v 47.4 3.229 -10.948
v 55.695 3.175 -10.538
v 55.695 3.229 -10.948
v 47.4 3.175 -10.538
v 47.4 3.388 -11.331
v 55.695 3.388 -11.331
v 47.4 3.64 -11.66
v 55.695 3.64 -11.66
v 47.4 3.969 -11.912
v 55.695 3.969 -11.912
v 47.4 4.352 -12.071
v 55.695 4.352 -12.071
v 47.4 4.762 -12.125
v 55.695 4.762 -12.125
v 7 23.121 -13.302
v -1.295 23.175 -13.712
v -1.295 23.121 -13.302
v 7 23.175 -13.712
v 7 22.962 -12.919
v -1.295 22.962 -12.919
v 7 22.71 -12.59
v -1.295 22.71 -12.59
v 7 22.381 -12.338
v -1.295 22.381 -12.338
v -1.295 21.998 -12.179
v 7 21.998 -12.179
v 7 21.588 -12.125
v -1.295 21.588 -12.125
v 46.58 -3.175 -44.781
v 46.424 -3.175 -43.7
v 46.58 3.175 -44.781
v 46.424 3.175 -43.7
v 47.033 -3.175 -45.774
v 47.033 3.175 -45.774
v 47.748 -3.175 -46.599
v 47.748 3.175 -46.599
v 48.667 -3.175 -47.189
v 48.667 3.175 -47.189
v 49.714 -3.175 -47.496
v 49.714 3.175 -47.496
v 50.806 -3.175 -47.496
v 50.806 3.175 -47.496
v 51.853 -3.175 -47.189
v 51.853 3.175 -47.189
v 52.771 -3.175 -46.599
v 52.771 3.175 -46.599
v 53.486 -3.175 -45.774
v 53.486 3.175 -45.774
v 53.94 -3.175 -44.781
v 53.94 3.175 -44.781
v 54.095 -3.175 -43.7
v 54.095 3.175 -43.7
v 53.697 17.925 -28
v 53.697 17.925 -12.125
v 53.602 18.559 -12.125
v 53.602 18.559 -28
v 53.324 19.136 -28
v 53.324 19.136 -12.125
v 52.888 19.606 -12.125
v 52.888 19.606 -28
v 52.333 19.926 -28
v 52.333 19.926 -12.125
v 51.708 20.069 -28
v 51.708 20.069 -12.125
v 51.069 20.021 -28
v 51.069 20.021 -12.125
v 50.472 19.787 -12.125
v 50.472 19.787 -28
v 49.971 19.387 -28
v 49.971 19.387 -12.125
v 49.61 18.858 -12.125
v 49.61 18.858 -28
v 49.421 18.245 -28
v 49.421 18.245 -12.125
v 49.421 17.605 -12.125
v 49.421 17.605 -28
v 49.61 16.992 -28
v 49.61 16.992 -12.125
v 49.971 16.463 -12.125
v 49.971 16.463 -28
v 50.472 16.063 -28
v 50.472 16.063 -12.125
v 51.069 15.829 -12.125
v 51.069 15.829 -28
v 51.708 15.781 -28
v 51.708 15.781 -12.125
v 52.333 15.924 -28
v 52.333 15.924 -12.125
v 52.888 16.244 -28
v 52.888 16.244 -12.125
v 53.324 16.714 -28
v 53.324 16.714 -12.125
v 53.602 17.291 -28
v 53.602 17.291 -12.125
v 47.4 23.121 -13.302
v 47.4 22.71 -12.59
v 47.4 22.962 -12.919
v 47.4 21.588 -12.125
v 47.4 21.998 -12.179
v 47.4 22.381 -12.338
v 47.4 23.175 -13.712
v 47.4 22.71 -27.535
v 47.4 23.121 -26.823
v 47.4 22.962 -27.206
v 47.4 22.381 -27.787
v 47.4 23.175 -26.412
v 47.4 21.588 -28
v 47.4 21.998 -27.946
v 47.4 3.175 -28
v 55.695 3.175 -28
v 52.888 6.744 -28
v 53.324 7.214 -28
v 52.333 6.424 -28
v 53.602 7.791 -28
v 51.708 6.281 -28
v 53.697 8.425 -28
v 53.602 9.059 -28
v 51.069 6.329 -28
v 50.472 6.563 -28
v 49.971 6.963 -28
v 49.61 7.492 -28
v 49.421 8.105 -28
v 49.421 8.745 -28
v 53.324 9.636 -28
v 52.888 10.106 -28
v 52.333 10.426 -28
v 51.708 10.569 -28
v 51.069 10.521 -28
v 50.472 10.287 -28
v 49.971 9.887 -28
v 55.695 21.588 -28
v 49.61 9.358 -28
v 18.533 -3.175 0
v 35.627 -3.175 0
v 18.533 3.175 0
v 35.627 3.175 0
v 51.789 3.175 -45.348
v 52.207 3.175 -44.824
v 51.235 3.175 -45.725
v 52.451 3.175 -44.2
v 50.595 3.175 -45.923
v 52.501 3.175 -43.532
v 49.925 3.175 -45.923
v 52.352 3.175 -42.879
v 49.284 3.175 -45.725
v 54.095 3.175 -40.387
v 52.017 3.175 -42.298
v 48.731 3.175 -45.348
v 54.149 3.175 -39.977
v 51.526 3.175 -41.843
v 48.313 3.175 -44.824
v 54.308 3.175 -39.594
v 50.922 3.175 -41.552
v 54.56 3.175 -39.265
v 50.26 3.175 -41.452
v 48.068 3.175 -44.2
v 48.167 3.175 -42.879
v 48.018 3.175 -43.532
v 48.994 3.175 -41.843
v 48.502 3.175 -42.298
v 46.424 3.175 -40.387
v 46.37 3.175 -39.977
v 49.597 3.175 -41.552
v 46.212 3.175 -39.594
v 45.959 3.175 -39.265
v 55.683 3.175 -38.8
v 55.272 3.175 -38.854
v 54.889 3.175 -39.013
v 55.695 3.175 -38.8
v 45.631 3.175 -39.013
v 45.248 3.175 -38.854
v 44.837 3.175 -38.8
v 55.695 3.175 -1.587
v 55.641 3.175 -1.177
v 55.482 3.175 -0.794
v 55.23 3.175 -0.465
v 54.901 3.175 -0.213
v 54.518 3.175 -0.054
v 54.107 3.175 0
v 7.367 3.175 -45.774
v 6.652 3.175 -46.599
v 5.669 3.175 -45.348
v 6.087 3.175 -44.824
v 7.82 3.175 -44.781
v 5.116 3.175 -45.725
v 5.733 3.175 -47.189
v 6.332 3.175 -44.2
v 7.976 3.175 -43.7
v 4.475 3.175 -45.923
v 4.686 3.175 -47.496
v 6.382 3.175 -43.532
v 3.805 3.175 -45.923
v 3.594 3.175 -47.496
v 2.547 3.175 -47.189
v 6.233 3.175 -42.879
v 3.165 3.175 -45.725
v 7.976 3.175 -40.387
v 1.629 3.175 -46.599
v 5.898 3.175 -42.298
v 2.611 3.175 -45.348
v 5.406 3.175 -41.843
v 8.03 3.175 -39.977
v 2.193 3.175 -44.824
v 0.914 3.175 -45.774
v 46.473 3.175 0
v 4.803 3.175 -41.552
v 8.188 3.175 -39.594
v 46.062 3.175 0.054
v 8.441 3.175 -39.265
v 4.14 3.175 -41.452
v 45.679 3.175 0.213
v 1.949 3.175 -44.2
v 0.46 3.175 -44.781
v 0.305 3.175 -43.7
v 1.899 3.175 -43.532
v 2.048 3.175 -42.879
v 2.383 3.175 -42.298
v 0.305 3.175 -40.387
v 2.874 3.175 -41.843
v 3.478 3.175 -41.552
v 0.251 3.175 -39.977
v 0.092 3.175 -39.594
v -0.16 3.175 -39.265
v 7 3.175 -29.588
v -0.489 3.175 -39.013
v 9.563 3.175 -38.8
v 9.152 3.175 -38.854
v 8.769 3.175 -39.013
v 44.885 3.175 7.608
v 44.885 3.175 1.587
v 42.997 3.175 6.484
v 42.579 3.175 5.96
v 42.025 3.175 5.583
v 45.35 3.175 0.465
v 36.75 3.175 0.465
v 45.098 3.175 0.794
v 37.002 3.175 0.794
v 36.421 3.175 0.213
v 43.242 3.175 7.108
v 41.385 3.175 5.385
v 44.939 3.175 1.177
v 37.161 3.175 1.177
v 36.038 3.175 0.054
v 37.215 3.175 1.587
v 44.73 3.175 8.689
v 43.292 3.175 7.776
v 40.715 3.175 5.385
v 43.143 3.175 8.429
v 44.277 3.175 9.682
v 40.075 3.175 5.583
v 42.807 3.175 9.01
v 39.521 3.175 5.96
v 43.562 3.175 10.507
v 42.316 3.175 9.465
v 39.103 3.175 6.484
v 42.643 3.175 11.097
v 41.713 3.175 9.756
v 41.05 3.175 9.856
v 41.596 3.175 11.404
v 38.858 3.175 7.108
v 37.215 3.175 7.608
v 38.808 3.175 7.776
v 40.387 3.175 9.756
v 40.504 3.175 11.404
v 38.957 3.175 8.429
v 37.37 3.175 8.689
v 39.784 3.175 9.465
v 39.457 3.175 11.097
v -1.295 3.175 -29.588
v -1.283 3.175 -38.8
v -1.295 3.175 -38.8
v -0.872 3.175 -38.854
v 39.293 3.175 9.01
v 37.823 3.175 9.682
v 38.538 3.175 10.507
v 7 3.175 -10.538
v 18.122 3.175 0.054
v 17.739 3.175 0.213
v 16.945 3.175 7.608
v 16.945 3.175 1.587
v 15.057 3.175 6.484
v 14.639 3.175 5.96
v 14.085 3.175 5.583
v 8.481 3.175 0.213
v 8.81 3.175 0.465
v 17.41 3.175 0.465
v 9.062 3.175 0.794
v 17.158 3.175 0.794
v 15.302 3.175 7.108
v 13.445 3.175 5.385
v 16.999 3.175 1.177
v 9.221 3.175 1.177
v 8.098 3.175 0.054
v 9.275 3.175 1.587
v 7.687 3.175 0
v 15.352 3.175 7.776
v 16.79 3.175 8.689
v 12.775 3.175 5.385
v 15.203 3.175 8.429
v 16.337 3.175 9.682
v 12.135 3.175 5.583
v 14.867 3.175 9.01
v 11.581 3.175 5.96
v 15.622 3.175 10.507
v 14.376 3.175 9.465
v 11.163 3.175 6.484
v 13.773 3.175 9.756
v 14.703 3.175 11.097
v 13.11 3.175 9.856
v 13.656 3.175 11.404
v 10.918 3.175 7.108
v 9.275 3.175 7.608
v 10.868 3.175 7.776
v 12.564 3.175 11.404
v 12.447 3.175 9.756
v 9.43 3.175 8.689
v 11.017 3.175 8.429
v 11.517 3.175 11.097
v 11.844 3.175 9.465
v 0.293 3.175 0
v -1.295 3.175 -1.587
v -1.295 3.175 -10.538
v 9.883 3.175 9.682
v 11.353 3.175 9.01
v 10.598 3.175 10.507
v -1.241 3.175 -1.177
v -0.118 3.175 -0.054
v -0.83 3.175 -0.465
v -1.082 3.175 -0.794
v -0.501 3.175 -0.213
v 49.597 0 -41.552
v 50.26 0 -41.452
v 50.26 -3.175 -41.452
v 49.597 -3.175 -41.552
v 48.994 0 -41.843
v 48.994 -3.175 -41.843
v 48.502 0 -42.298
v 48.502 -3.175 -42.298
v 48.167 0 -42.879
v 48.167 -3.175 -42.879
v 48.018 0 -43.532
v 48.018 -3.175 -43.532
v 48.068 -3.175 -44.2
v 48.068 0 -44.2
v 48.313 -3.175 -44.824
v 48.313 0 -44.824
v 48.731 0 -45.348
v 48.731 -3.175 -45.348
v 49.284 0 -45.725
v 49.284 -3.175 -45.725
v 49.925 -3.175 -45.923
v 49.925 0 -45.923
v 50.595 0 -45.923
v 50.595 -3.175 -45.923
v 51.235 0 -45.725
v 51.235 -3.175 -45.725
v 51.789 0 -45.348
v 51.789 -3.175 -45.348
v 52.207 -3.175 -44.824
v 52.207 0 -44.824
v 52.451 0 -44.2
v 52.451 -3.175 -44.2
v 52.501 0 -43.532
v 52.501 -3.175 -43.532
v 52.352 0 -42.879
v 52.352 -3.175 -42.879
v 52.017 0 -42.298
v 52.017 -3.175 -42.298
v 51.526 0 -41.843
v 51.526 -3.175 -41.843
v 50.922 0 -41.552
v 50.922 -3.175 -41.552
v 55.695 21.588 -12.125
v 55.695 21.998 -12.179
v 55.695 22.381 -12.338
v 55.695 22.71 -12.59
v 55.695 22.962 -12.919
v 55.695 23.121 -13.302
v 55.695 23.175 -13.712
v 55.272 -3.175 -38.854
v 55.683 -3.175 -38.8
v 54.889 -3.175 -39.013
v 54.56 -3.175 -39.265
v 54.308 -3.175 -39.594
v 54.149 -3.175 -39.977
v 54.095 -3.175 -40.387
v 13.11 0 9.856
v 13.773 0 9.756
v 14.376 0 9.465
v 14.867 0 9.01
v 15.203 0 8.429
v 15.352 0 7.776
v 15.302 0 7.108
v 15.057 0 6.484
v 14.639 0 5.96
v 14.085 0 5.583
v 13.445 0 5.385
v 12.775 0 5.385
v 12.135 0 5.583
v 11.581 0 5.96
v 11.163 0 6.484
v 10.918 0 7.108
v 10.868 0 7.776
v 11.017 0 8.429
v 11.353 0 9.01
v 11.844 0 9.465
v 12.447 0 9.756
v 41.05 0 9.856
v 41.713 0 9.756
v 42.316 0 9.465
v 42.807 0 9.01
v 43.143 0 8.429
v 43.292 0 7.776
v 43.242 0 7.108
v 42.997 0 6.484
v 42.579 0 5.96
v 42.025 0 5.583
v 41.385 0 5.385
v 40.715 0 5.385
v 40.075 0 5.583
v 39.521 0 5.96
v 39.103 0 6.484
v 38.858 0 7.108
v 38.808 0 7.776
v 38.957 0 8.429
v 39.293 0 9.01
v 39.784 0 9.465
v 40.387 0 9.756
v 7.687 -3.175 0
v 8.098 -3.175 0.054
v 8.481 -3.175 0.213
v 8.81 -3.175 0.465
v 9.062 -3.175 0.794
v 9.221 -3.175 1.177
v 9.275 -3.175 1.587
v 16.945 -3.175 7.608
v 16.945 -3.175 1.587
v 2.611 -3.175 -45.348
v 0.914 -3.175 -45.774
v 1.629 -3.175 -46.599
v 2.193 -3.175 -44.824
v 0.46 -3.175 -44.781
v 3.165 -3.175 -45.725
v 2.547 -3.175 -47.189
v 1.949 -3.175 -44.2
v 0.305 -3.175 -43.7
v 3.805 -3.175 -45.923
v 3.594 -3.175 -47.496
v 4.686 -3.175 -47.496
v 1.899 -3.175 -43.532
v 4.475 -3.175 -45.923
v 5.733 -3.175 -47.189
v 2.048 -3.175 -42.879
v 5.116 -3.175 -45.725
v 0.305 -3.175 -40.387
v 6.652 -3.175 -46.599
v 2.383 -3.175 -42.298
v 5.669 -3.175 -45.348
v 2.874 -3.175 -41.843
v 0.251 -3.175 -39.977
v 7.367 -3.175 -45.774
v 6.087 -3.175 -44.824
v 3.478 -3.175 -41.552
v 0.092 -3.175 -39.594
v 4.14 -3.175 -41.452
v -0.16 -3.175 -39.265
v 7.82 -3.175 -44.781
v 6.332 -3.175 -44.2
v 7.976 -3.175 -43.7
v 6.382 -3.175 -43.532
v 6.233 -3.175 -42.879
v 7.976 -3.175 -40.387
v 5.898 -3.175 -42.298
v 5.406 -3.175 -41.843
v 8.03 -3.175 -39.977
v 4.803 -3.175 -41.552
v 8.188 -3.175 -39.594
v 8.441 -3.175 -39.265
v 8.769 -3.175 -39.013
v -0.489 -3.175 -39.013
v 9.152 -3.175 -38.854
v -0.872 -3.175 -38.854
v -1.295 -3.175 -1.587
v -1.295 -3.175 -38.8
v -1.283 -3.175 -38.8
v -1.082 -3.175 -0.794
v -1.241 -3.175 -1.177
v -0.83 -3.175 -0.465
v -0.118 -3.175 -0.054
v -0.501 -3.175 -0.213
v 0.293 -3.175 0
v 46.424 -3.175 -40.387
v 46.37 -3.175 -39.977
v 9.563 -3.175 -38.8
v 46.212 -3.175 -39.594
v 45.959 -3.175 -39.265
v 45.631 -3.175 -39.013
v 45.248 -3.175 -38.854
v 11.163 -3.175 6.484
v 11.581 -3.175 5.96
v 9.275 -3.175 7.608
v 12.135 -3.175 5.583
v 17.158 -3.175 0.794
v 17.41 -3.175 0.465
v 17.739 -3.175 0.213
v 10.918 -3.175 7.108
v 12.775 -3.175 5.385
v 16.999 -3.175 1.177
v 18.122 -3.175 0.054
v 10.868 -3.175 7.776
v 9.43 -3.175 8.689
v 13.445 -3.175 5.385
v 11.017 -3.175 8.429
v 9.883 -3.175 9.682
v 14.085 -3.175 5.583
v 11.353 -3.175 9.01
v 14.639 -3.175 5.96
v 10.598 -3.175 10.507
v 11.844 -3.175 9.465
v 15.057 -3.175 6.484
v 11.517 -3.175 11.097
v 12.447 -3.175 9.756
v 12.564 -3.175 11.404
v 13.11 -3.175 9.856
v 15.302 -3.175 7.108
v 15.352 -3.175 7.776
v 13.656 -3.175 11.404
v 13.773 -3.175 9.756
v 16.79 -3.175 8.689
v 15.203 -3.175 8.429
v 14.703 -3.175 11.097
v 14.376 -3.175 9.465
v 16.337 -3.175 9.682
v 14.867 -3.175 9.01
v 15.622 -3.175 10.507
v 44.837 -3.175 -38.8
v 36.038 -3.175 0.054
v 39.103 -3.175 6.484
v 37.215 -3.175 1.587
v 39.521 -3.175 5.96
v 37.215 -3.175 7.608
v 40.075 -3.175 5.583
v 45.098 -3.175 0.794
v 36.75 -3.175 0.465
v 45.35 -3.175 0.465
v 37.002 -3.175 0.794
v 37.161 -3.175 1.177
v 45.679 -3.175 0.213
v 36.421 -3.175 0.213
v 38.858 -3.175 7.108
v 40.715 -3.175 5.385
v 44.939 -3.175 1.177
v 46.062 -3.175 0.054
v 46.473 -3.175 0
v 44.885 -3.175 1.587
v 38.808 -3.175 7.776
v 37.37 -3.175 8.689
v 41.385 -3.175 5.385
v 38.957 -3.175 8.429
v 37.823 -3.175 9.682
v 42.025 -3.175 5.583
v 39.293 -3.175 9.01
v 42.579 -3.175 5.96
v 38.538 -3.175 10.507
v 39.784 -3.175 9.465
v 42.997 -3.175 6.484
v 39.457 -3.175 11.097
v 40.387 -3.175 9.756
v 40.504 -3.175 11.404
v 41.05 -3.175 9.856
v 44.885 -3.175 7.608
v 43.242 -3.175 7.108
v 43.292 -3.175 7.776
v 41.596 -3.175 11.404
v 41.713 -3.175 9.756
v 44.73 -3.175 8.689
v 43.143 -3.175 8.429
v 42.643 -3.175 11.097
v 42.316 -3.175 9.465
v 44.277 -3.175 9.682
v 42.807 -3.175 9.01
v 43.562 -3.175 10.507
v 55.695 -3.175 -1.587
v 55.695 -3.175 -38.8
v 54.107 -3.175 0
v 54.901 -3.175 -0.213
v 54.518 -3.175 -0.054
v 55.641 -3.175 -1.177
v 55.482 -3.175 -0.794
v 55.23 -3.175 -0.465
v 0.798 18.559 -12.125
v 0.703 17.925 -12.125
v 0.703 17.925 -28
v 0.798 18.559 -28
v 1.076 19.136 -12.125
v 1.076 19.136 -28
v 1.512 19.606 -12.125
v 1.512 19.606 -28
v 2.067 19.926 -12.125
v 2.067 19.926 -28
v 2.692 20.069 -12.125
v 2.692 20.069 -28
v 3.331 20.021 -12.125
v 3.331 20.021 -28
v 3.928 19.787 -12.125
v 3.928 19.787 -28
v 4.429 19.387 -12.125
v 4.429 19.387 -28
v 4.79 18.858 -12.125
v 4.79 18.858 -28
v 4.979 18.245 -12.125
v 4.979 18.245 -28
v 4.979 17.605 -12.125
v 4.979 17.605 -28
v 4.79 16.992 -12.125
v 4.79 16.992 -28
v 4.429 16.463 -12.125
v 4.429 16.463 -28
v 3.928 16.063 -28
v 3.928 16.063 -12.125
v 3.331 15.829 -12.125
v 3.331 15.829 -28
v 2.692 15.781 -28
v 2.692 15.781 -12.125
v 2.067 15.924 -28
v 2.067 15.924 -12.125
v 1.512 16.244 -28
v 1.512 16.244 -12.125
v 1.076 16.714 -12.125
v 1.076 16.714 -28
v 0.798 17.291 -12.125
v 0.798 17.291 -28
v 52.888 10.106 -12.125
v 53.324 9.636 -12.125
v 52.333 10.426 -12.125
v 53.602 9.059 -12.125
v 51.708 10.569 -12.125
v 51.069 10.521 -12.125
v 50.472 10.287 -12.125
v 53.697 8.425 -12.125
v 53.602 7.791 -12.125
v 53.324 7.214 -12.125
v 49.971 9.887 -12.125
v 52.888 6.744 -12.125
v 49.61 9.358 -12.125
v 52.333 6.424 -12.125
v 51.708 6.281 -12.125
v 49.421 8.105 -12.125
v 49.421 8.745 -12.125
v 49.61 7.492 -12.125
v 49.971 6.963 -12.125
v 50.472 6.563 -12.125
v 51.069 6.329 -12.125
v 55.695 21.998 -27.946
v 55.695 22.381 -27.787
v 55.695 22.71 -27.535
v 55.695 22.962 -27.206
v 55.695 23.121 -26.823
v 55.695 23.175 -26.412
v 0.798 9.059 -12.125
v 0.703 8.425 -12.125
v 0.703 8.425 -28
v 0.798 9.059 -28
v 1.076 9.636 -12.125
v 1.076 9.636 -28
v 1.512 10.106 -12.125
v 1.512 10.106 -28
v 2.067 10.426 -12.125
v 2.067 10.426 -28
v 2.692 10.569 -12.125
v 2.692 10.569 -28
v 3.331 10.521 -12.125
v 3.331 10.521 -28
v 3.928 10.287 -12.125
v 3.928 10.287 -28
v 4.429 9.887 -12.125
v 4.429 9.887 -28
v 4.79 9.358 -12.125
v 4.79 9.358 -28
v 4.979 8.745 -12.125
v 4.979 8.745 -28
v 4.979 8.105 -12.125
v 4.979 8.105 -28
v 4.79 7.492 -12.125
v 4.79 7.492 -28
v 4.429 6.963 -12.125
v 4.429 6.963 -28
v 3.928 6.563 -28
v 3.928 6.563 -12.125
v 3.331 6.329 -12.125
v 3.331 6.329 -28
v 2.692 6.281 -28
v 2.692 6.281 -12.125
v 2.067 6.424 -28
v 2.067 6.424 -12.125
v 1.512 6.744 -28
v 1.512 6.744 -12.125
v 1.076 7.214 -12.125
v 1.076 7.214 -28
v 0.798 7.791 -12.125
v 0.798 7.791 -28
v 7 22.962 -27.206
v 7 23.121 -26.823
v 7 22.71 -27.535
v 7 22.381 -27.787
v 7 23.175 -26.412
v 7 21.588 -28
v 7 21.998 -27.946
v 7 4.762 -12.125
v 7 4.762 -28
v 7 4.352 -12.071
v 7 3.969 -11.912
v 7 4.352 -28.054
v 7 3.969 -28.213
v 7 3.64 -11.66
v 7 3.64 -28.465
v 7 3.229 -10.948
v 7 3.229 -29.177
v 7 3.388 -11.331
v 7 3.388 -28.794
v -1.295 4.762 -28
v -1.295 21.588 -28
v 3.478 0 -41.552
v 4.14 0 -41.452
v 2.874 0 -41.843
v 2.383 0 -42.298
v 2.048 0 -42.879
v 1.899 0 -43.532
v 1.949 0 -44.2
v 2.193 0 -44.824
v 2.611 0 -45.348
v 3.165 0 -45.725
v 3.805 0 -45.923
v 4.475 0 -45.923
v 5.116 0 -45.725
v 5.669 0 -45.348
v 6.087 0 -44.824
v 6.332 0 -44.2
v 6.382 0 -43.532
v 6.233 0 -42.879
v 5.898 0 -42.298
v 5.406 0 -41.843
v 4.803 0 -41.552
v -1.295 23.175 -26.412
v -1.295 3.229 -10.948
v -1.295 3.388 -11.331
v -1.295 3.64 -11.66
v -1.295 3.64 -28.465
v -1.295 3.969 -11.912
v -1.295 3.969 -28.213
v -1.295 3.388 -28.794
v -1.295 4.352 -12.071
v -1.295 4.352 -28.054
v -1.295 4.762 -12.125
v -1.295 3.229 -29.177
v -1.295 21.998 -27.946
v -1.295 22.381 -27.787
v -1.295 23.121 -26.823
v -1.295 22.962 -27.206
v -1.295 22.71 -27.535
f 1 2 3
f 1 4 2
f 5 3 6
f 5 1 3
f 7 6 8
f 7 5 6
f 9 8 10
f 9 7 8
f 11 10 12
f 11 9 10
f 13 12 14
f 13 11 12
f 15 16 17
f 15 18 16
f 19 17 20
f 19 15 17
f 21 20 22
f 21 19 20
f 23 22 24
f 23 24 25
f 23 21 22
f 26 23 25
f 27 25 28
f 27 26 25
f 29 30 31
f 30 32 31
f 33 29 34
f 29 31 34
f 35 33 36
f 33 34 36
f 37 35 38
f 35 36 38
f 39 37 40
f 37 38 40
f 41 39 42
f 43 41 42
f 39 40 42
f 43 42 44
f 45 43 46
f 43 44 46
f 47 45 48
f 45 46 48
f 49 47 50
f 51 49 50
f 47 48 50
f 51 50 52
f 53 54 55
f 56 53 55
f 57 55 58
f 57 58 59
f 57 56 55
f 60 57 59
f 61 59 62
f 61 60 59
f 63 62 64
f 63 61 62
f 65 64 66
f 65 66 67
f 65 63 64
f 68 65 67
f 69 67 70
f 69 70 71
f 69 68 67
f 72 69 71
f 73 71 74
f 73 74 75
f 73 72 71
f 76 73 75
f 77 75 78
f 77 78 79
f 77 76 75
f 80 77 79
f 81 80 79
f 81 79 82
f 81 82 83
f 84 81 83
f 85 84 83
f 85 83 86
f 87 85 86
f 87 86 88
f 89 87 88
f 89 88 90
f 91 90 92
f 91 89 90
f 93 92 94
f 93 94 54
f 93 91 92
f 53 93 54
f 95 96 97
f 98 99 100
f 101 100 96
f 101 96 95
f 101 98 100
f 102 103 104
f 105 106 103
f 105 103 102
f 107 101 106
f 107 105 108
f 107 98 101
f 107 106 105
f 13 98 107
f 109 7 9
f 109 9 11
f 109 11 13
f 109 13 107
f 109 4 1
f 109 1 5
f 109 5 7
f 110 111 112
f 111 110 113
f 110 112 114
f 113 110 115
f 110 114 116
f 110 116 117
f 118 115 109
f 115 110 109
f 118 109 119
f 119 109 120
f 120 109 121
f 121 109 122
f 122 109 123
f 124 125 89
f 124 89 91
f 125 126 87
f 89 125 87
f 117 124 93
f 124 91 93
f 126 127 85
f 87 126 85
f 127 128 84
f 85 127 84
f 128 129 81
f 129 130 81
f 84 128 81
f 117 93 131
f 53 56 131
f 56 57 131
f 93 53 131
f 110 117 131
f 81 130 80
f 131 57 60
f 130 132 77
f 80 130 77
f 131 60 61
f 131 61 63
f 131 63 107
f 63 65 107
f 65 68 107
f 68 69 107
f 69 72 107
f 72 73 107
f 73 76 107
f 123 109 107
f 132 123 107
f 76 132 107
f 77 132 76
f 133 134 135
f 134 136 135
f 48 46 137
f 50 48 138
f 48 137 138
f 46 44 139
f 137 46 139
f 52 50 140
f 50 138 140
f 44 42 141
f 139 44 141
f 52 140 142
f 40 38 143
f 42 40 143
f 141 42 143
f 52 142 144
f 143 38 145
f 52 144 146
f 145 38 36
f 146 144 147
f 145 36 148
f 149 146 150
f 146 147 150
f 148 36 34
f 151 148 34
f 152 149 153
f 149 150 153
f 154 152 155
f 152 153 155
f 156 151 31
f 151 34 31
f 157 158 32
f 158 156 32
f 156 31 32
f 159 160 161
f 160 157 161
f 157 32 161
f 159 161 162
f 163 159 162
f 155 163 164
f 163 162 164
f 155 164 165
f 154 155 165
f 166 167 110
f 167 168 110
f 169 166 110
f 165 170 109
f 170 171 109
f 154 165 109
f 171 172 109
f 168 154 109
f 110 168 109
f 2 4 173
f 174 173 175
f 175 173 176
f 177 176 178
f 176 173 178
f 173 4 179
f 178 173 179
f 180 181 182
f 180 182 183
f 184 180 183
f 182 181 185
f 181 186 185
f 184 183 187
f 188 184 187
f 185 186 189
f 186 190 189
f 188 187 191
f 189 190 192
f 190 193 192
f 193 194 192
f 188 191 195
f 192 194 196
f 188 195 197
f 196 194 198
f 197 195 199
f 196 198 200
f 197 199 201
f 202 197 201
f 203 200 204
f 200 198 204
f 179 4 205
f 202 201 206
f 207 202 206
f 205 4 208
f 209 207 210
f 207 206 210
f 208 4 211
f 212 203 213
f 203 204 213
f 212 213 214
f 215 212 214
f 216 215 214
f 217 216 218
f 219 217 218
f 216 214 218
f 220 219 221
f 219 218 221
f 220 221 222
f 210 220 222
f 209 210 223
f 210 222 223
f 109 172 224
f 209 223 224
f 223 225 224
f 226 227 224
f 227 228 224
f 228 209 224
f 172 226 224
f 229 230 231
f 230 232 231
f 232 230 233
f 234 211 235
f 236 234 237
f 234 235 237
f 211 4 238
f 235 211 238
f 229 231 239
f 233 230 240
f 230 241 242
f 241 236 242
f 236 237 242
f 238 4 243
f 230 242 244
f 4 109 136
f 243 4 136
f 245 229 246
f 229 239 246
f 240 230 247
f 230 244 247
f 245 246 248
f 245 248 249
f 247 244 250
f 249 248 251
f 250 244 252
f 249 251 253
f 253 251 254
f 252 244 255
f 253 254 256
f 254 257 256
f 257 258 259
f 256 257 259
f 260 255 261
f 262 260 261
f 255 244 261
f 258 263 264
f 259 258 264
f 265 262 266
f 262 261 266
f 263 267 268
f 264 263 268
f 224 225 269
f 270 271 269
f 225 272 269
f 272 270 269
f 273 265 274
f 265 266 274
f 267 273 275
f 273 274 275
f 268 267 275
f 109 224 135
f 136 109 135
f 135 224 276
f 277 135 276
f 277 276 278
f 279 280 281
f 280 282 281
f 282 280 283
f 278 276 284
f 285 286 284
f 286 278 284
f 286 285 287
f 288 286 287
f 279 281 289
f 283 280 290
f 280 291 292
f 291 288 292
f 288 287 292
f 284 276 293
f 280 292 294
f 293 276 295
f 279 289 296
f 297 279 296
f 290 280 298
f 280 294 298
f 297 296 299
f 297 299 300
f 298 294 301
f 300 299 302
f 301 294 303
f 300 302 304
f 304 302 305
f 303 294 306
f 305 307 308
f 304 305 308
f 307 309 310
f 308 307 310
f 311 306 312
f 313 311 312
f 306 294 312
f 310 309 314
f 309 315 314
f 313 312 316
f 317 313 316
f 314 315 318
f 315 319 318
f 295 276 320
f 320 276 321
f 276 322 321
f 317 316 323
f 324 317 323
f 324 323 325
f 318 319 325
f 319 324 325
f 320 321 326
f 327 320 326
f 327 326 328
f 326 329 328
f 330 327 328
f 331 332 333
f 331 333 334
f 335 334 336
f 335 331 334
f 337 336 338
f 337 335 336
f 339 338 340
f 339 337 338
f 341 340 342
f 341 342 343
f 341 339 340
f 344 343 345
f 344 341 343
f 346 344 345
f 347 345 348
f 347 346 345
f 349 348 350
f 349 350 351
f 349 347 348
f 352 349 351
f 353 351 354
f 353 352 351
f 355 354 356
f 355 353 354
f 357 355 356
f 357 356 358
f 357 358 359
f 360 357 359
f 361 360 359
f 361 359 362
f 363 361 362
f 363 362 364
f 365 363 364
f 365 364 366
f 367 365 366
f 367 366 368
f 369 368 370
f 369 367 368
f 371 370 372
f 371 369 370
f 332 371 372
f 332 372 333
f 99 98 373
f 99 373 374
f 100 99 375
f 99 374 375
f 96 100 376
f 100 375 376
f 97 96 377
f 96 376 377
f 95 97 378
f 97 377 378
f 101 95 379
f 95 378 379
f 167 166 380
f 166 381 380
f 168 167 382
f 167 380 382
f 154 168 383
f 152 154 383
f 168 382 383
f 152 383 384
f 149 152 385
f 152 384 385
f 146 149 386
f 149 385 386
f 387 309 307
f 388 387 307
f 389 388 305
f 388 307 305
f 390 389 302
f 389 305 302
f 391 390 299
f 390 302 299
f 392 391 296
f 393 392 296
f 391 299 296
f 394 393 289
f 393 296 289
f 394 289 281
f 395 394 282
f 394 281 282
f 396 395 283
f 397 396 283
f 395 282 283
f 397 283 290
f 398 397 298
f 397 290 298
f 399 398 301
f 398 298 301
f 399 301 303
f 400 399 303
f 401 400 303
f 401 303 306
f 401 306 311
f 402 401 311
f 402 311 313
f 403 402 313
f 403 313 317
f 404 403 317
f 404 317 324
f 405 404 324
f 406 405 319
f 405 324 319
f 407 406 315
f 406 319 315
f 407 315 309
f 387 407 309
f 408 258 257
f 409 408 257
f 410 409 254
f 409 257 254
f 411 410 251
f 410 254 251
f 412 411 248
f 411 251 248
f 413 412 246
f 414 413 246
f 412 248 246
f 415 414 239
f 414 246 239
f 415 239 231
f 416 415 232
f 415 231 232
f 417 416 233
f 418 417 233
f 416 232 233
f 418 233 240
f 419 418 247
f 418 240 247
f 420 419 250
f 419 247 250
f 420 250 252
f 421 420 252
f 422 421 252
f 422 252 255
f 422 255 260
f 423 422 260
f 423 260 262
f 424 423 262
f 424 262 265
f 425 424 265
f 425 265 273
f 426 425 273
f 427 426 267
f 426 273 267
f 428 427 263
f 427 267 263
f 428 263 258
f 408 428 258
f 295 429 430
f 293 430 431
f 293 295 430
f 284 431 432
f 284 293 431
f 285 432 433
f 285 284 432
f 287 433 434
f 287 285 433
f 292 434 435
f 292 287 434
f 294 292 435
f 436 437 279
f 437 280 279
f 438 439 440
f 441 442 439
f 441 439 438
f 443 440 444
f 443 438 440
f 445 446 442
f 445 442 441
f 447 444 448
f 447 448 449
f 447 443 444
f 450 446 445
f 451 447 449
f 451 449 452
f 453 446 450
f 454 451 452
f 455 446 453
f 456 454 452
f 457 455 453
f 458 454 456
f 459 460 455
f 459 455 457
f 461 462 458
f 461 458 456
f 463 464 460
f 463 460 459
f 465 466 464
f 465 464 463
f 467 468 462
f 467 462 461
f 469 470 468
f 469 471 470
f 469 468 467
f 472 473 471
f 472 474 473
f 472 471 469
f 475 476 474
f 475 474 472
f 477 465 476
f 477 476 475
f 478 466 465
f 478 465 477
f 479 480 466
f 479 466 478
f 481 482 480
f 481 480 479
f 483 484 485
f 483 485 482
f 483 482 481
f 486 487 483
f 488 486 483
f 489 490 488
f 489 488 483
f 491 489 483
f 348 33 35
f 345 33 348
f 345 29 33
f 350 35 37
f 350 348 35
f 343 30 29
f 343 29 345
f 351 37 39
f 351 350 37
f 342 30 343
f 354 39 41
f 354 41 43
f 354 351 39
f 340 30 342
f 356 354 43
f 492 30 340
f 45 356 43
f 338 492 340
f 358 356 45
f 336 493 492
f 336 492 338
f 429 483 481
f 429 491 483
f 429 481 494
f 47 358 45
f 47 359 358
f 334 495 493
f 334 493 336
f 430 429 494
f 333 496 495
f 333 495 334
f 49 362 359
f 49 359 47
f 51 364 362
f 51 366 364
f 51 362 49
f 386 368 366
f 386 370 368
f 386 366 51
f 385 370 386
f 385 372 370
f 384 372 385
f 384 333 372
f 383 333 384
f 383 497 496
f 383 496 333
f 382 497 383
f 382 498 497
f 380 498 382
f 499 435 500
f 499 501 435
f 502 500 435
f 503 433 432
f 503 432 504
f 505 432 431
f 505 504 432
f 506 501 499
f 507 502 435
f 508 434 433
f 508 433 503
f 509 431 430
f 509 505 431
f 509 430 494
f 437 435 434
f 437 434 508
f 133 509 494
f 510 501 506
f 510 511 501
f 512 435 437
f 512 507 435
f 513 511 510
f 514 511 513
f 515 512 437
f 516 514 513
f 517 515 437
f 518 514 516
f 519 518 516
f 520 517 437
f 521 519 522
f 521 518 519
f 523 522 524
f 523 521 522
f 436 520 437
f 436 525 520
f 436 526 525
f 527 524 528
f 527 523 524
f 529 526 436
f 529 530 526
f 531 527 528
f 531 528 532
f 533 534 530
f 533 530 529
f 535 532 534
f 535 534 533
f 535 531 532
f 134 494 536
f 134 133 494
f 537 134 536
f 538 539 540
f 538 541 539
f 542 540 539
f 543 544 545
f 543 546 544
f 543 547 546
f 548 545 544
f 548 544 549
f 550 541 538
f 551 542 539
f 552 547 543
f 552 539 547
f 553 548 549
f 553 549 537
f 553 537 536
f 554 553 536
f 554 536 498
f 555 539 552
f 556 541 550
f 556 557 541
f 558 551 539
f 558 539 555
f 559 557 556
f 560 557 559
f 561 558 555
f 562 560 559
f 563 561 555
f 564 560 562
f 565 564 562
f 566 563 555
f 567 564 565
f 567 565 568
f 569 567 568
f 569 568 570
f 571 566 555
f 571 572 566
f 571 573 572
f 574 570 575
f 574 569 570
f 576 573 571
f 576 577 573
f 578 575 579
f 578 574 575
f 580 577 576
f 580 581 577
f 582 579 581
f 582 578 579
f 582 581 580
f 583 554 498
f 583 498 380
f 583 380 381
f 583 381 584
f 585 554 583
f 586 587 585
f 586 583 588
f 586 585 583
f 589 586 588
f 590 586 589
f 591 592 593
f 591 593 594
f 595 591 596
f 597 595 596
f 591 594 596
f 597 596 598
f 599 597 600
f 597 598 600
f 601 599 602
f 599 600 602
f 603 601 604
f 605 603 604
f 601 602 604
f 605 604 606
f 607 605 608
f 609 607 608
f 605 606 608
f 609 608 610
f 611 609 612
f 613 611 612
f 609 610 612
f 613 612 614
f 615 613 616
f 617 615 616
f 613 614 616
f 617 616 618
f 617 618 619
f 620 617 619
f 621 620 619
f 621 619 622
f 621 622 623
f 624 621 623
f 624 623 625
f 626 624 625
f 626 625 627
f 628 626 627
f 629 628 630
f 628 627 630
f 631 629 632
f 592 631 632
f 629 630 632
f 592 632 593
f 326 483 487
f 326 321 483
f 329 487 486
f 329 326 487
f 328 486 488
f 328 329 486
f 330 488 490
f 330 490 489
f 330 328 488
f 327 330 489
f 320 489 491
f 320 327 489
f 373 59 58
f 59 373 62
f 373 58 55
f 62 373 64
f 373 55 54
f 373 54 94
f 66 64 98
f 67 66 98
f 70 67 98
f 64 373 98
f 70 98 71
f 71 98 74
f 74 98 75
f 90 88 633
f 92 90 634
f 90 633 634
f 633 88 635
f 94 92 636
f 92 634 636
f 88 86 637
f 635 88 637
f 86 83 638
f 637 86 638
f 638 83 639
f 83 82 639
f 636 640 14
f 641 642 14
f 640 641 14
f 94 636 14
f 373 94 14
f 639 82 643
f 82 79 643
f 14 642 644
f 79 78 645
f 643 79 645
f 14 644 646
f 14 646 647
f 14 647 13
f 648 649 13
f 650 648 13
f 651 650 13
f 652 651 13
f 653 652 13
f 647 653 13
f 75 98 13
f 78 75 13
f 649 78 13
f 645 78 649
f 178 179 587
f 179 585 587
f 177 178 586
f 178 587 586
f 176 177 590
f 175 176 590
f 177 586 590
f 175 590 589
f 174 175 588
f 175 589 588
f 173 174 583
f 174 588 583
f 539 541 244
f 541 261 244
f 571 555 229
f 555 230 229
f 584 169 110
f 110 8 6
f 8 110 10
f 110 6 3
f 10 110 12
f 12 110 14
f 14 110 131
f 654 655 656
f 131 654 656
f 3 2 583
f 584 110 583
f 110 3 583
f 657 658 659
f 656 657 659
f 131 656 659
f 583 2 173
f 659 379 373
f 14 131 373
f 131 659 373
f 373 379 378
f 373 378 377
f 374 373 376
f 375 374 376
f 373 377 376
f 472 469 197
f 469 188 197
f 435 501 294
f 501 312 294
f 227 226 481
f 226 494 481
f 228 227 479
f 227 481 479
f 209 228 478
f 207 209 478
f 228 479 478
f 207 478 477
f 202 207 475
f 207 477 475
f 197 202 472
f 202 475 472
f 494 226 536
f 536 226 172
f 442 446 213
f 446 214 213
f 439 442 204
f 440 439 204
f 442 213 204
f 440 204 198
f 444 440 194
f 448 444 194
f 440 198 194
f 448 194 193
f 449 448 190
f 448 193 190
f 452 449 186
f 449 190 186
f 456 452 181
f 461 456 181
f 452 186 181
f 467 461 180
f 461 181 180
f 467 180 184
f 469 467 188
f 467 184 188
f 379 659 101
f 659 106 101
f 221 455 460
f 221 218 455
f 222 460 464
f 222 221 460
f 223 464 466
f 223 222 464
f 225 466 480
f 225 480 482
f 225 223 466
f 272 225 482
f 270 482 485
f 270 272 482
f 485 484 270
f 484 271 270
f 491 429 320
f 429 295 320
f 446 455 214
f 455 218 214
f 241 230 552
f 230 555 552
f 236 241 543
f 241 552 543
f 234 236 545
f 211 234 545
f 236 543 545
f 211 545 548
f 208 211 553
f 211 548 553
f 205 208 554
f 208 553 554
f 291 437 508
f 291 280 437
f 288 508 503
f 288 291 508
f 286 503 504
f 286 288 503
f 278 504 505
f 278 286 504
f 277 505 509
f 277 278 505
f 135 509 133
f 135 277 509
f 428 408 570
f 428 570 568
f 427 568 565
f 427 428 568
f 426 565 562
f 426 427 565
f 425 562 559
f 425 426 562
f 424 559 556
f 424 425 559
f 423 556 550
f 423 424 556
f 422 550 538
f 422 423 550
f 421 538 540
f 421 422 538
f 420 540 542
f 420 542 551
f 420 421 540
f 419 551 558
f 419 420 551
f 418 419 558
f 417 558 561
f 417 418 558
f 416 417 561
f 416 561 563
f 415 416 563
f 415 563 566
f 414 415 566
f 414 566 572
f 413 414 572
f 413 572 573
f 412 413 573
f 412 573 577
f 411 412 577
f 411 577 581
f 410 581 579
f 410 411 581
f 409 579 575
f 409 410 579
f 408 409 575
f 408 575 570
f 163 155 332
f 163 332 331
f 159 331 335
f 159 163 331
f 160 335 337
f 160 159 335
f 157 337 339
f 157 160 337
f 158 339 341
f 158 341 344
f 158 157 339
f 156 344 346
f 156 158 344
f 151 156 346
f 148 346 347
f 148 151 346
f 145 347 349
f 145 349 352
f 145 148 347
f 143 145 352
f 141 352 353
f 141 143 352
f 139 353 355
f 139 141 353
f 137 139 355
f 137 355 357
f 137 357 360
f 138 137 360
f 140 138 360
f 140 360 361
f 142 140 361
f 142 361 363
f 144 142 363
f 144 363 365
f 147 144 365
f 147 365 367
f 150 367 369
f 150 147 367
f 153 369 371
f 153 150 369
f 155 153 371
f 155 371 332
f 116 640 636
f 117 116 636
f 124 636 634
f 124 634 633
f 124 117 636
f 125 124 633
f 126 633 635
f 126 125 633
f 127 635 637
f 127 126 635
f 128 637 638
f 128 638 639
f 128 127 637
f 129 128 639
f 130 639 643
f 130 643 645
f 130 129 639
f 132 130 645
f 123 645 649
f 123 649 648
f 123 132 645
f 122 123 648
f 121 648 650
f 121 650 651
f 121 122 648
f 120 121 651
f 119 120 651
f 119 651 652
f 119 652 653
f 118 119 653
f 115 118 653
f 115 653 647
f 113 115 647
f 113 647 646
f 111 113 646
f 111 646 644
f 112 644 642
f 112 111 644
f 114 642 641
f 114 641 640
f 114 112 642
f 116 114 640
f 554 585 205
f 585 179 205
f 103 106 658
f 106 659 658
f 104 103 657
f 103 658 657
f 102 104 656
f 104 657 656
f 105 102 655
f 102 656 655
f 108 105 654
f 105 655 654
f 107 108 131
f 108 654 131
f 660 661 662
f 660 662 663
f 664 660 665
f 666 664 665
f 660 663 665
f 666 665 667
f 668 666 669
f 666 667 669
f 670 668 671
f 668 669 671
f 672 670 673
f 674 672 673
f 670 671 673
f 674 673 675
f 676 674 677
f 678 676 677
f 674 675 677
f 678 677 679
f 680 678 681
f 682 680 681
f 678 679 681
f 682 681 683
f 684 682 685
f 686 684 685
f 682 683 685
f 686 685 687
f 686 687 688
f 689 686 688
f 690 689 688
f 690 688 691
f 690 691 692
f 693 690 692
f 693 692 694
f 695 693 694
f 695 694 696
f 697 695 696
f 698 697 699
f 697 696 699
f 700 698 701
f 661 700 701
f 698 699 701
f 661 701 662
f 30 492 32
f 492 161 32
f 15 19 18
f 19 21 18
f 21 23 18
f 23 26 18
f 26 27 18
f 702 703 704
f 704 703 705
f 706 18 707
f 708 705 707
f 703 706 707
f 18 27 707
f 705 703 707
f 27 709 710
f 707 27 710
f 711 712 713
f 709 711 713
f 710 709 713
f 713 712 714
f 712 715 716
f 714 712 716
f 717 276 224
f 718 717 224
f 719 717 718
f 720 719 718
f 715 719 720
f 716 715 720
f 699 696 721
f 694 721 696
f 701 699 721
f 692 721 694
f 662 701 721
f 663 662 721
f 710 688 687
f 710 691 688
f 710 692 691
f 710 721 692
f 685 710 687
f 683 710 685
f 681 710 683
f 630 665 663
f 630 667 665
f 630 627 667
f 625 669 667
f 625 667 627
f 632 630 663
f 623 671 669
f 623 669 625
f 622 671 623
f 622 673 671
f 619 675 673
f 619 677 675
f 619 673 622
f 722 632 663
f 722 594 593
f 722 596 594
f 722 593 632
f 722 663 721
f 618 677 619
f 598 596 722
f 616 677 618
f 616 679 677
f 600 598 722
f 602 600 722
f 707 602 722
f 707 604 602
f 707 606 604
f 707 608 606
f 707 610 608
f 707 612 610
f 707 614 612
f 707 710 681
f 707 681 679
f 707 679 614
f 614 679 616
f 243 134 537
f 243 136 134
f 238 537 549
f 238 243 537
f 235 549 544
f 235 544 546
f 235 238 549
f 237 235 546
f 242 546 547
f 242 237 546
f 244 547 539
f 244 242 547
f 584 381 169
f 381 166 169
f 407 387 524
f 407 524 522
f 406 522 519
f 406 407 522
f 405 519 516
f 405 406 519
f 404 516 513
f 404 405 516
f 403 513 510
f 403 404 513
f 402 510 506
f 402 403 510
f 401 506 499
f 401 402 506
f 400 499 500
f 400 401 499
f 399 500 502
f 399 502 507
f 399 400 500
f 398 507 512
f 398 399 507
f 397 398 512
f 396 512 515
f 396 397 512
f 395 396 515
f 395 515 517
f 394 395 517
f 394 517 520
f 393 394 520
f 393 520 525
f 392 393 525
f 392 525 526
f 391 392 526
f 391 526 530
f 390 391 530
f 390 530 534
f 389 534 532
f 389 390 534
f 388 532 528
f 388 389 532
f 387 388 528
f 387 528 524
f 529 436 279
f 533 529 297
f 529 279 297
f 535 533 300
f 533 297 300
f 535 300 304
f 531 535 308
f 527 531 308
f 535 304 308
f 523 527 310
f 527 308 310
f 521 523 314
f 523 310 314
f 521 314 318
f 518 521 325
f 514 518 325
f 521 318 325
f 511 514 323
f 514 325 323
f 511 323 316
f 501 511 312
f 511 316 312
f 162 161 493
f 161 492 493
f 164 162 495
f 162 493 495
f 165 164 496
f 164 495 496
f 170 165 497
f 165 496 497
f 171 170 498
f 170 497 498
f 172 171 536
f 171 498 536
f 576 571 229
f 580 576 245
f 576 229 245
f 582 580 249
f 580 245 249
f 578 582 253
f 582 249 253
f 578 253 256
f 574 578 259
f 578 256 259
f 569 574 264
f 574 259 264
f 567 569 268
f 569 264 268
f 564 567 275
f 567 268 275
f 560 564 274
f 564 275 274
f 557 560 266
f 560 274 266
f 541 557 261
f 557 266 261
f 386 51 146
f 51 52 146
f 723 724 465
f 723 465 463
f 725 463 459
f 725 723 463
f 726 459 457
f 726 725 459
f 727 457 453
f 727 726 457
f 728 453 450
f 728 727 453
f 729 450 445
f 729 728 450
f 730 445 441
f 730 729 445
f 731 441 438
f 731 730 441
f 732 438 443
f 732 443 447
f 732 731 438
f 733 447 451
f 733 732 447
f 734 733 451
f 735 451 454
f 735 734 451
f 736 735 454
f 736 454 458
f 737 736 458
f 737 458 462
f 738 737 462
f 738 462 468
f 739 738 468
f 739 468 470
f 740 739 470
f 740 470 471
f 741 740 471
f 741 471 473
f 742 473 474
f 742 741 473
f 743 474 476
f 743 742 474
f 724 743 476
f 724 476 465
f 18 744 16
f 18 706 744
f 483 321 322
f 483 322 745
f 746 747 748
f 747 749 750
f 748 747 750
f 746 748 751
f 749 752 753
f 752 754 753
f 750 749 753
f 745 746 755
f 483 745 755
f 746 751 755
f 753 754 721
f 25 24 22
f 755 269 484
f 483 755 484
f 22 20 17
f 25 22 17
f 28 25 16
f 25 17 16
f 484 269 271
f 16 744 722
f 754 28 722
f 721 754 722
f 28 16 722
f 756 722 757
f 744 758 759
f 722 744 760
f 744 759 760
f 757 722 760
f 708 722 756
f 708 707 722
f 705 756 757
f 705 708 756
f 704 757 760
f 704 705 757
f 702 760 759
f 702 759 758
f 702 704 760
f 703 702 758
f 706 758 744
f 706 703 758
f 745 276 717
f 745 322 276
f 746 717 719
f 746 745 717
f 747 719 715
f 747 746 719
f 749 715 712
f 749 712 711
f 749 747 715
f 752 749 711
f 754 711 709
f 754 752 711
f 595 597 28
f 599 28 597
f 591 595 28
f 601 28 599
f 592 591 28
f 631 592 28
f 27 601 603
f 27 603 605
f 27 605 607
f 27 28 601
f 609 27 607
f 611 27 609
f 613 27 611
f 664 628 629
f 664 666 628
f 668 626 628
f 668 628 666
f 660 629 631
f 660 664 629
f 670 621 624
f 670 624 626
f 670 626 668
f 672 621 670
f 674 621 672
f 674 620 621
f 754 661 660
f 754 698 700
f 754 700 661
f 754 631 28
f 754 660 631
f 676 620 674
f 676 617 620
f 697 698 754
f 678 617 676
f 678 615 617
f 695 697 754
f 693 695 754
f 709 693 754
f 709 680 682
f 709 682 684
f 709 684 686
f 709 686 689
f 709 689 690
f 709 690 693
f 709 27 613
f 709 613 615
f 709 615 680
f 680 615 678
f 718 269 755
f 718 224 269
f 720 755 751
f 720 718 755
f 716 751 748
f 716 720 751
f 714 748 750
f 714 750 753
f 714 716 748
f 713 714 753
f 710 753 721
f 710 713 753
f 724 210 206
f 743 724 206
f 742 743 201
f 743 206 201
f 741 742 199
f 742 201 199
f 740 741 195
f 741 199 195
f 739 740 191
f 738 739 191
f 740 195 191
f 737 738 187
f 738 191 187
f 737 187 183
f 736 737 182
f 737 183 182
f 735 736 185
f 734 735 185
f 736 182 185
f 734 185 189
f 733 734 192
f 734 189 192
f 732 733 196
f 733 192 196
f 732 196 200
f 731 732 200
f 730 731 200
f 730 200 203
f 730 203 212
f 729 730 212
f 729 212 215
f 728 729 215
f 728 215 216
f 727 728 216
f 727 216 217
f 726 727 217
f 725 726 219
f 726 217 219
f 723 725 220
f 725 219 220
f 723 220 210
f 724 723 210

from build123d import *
from build123d.topology import SkipClean

# Parameters (mm, degrees)
SKETCH1_W           = 54.4
SKETCH1_H           = 38.8
BOSS_EXTRUDE1_DEPTH = 3.175
SKETCH2_W           = 7
SKETCH2_H           = 15.875
BOSS_EXTRUDE2_DEPTH = 20
SKETCH3_R           = 3.8354
SKETCH3_R_2         = 2.2479
BOSS_EXTRUDE3_DEPTH = 3.175
LPATTERN1_COUNT     = 2
LPATTERN1_PITCH     = 27.94
SKETCH6_R           = 3.8354
SKETCH6_R_2         = 2.2479
BOSS_EXTRUDE6_DEPTH = 3.175
SKETCH7_R           = 2.150000018
CUT_EXTRUDE1_DEPTH  = 15.875
BOSS_EXTRUDE7_DEPTH = 1.2948
SKETCH11_R          = 2.2479
BOSS_EXTRUDE8_DEPTH = 3.175
FILLET1_R           = 1.5875


with BuildPart() as part:
    # Sketch1 → Boss-Extrude1 (new body)
    with BuildSketch(Plane(origin=(0, 0, 0), x_dir=(1, 0, 0), z_dir=(0, 1, 0))):
        with Locations((27.2, 19.4)):
            Rectangle(SKETCH1_W, SKETCH1_H)
    extrude(amount=BOSS_EXTRUDE1_DEPTH)

    # Sketch2 → Boss-Extrude2 (add)
    with BuildSketch(Plane(origin=(0, 3.175, 0), x_dir=(1, 0, 0), z_dir=(0, 1, 0))):
        with Locations((3.5, 20.0625)):
            Rectangle(SKETCH2_W, SKETCH2_H)
    boss_extrude2 = extrude(amount=BOSS_EXTRUDE2_DEPTH)

    # Mirror1: Boss-Extrude2 across plane
    add(boss_extrude2.mirror(Plane.ZY.offset(-27.2)))

    # Sketch3 → Boss-Extrude3 (add)
    # profile 1 of 2: a face of its own
    with BuildSketch(Plane(origin=(0, 3.175, 0), x_dir=(1, 0, 0), z_dir=(0, 1, 0))):
        with Locations((13.109999942, -7.608)):
            Circle(SKETCH3_R)
        with Locations(Location((13.109999942, -7.608, 0), (0, 0, 270))):
            Circle(SKETCH3_R_2, mode=Mode.SUBTRACT)
    # profile 2 of 2: a face of its own
    with BuildSketch(Plane(origin=(0, 3.175, 0), x_dir=(1, 0, 0), z_dir=(0, 1, 0))):
        with BuildLine():
            Line((9.274599942, 0), (9.274599942, -7.608))
            ThreePointArc((9.274599942, -7.608), (13.109999942, -3.7726), (16.945399942, -7.608))
            Line((16.945399942, -7.608), (16.945399942, 0))
            Line((16.945399942, 0), (9.274599942, 0))
        make_face()
    boss_extrude3 = extrude(amount=-BOSS_EXTRUDE3_DEPTH)

    # LPattern1: Boss-Extrude3 ×2
    with Locations(*[(i * LPATTERN1_PITCH, 0, 0) for i in range(1, LPATTERN1_COUNT)]):
        add(boss_extrude3)

    # Sketch6 → Boss-Extrude6 (add)
    # profile 1 of 2: a face of its own
    with BuildSketch(Plane(origin=(0, 3.175, 0), x_dir=(1, 0, 0), z_dir=(0, 1, 0))):
        with Locations((4.1402, 43.7)):
            Circle(SKETCH6_R)
        with Locations(Location((4.1402, 43.7, 0), (0, 0, 270))):
            Circle(SKETCH6_R_2, mode=Mode.SUBTRACT)
    # profile 2 of 2: a face of its own
    with BuildSketch(Plane(origin=(0, 3.175, 0), x_dir=(1, 0, 0), z_dir=(0, 1, 0))):
        with BuildLine():
            ThreePointArc((7.9756, 43.7), (4.1402, 39.8646), (0.3048, 43.7))
            Line((0.3048, 43.7), (0.3048, 38.8))
            Line((0.3048, 38.8), (7.9756, 38.8))
            Line((7.9756, 38.8), (7.9756, 43.7))
        make_face()
    boss_extrude6 = extrude(amount=-BOSS_EXTRUDE6_DEPTH)

    # Mirror3: Boss-Extrude6 across plane
    add(boss_extrude6.mirror(Plane.ZY.offset(-27.2)))

    # Sketch7 → Cut-Extrude1 (cut)
    with BuildSketch(Plane(origin=(0, 0, -28), x_dir=(-1, 0, 0), z_dir=(0, 0, -1))):
        with Locations((-2.852600116, 17.925)):
            Circle(SKETCH7_R)
        with Locations((-2.852600116, 8.425)):
            Circle(SKETCH7_R)
    cut_extrude1 = extrude(amount=-CUT_EXTRUDE1_DEPTH, mode=Mode.SUBTRACT)

    # Sketch9 → Boss-Extrude7 (add)
    with BuildSketch(Plane.ZY):
        Polygon((-38.8, 0), (-38.8, 3.175), (-28, 3.175), (-28, 23.175), (-12.125, 23.175), (-12.125, 3.175), (0, 3.175), (0, 0), align=None)
    boss_extrude7 = extrude(amount=BOSS_EXTRUDE7_DEPTH)

    # Mirror4: Boss-Extrude7 across plane
    add(boss_extrude7.mirror(Plane.ZY.offset(-27.2)))

    # Mirror5: Cut-Extrude1 across plane
    add(cut_extrude1.mirror(Plane.ZY.offset(-27.2)), mode=Mode.SUBTRACT)

    # Sketch11 → Boss-Extrude8 (add)
    with SkipClean():  # the faces are left unmerged after this step: merging them gives an invalid solid
        with BuildSketch(Plane.XZ):
            with BuildLine():
                Line((0.3048, -38.8), (0.3048, -43.7))
                ThreePointArc((0.3048, -43.7), (4.1402, -47.5354), (7.9756, -43.7))
                Line((7.9756, -43.7), (7.9756, -38.8))
                Line((7.9756, -38.8), (46.4244, -38.8))
                Line((46.4244, -38.8), (46.4244, -43.7))
                ThreePointArc((46.4244, -43.7), (50.2598, -47.5354), (54.0952, -43.7))
                Line((54.0952, -43.7), (54.0952, -38.8))
                Line((54.0952, -38.8), (55.6948, -38.8))
                Line((55.6948, -38.8), (55.6948, 0))
                Line((55.6948, 0), (44.885399942, 0))
                Line((44.885399942, 0), (44.885399942, 7.608))
                ThreePointArc((44.885399942, 7.608), (41.049999942, 11.4434), (37.214599942, 7.608))
                Line((37.214599942, 7.608), (37.214599942, 0))
                Line((37.214599942, 0), (16.945399942, 0))
                Line((16.945399942, 0), (16.945399942, 7.608))
                ThreePointArc((16.945399942, 7.608), (13.109999942, 11.4434), (9.274599942, 7.608))
                Line((9.274599942, 7.608), (9.274599942, 0))
                Line((9.274599942, 0), (-1.2948, 0))
                Line((-1.2948, 0), (-1.2948, -38.8))
                Line((-1.2948, -38.8), (0.3048, -38.8))
            make_face()
            with Locations(Location((4.1402, -43.7, 0), (0, 0, 90))):
                Circle(SKETCH11_R, mode=Mode.SUBTRACT)
            with Locations(Location((50.2598, -43.7, 0), (0, 0, 90))):
                Circle(SKETCH11_R, mode=Mode.SUBTRACT)
            with Locations(Location((41.049999942, 7.608, 0), (0, 0, 90))):
                Circle(SKETCH11_R, mode=Mode.SUBTRACT)
            with Locations(Location((13.109999942, 7.608, 0), (0, 0, 90))):
                Circle(SKETCH11_R, mode=Mode.SUBTRACT)
        extrude(amount=BOSS_EXTRUDE8_DEPTH)
    add(part.part.scale(1), mode=Mode.REPLACE)  # the faces are merged on a copy

    # Fillet1
    fillet1_edges = [part.edges().sort_by_distance(p)[0] for p in [
        (-1.2948, 0, 0),
        (55.6948, 0, 0),
        (2.8526, 3.175, -12.125),
        (2.8526, 3.175, -28),
        (2.8526, 23.175, -12.125),
        (2.8526, 23.175, -28),
        (51.5474, 23.175, -28),
        (51.5474, 23.175, -12.125),
        (51.5474, 3.175, -12.125),
        (16.945399942, 0, 0),
        (9.274599942, 0, 0),
        (44.885399942, 0, 0),
        (37.214599942, 0, 0),
        (0.3048, 0, -38.8),
        (7.9756, 0, -38.8),
        (46.4244, 0, -38.8),
        (54.0952, 0, -38.8),
    ]]
    fillet(fillet1_edges, radius=FILLET1_R)


solid = part.part
